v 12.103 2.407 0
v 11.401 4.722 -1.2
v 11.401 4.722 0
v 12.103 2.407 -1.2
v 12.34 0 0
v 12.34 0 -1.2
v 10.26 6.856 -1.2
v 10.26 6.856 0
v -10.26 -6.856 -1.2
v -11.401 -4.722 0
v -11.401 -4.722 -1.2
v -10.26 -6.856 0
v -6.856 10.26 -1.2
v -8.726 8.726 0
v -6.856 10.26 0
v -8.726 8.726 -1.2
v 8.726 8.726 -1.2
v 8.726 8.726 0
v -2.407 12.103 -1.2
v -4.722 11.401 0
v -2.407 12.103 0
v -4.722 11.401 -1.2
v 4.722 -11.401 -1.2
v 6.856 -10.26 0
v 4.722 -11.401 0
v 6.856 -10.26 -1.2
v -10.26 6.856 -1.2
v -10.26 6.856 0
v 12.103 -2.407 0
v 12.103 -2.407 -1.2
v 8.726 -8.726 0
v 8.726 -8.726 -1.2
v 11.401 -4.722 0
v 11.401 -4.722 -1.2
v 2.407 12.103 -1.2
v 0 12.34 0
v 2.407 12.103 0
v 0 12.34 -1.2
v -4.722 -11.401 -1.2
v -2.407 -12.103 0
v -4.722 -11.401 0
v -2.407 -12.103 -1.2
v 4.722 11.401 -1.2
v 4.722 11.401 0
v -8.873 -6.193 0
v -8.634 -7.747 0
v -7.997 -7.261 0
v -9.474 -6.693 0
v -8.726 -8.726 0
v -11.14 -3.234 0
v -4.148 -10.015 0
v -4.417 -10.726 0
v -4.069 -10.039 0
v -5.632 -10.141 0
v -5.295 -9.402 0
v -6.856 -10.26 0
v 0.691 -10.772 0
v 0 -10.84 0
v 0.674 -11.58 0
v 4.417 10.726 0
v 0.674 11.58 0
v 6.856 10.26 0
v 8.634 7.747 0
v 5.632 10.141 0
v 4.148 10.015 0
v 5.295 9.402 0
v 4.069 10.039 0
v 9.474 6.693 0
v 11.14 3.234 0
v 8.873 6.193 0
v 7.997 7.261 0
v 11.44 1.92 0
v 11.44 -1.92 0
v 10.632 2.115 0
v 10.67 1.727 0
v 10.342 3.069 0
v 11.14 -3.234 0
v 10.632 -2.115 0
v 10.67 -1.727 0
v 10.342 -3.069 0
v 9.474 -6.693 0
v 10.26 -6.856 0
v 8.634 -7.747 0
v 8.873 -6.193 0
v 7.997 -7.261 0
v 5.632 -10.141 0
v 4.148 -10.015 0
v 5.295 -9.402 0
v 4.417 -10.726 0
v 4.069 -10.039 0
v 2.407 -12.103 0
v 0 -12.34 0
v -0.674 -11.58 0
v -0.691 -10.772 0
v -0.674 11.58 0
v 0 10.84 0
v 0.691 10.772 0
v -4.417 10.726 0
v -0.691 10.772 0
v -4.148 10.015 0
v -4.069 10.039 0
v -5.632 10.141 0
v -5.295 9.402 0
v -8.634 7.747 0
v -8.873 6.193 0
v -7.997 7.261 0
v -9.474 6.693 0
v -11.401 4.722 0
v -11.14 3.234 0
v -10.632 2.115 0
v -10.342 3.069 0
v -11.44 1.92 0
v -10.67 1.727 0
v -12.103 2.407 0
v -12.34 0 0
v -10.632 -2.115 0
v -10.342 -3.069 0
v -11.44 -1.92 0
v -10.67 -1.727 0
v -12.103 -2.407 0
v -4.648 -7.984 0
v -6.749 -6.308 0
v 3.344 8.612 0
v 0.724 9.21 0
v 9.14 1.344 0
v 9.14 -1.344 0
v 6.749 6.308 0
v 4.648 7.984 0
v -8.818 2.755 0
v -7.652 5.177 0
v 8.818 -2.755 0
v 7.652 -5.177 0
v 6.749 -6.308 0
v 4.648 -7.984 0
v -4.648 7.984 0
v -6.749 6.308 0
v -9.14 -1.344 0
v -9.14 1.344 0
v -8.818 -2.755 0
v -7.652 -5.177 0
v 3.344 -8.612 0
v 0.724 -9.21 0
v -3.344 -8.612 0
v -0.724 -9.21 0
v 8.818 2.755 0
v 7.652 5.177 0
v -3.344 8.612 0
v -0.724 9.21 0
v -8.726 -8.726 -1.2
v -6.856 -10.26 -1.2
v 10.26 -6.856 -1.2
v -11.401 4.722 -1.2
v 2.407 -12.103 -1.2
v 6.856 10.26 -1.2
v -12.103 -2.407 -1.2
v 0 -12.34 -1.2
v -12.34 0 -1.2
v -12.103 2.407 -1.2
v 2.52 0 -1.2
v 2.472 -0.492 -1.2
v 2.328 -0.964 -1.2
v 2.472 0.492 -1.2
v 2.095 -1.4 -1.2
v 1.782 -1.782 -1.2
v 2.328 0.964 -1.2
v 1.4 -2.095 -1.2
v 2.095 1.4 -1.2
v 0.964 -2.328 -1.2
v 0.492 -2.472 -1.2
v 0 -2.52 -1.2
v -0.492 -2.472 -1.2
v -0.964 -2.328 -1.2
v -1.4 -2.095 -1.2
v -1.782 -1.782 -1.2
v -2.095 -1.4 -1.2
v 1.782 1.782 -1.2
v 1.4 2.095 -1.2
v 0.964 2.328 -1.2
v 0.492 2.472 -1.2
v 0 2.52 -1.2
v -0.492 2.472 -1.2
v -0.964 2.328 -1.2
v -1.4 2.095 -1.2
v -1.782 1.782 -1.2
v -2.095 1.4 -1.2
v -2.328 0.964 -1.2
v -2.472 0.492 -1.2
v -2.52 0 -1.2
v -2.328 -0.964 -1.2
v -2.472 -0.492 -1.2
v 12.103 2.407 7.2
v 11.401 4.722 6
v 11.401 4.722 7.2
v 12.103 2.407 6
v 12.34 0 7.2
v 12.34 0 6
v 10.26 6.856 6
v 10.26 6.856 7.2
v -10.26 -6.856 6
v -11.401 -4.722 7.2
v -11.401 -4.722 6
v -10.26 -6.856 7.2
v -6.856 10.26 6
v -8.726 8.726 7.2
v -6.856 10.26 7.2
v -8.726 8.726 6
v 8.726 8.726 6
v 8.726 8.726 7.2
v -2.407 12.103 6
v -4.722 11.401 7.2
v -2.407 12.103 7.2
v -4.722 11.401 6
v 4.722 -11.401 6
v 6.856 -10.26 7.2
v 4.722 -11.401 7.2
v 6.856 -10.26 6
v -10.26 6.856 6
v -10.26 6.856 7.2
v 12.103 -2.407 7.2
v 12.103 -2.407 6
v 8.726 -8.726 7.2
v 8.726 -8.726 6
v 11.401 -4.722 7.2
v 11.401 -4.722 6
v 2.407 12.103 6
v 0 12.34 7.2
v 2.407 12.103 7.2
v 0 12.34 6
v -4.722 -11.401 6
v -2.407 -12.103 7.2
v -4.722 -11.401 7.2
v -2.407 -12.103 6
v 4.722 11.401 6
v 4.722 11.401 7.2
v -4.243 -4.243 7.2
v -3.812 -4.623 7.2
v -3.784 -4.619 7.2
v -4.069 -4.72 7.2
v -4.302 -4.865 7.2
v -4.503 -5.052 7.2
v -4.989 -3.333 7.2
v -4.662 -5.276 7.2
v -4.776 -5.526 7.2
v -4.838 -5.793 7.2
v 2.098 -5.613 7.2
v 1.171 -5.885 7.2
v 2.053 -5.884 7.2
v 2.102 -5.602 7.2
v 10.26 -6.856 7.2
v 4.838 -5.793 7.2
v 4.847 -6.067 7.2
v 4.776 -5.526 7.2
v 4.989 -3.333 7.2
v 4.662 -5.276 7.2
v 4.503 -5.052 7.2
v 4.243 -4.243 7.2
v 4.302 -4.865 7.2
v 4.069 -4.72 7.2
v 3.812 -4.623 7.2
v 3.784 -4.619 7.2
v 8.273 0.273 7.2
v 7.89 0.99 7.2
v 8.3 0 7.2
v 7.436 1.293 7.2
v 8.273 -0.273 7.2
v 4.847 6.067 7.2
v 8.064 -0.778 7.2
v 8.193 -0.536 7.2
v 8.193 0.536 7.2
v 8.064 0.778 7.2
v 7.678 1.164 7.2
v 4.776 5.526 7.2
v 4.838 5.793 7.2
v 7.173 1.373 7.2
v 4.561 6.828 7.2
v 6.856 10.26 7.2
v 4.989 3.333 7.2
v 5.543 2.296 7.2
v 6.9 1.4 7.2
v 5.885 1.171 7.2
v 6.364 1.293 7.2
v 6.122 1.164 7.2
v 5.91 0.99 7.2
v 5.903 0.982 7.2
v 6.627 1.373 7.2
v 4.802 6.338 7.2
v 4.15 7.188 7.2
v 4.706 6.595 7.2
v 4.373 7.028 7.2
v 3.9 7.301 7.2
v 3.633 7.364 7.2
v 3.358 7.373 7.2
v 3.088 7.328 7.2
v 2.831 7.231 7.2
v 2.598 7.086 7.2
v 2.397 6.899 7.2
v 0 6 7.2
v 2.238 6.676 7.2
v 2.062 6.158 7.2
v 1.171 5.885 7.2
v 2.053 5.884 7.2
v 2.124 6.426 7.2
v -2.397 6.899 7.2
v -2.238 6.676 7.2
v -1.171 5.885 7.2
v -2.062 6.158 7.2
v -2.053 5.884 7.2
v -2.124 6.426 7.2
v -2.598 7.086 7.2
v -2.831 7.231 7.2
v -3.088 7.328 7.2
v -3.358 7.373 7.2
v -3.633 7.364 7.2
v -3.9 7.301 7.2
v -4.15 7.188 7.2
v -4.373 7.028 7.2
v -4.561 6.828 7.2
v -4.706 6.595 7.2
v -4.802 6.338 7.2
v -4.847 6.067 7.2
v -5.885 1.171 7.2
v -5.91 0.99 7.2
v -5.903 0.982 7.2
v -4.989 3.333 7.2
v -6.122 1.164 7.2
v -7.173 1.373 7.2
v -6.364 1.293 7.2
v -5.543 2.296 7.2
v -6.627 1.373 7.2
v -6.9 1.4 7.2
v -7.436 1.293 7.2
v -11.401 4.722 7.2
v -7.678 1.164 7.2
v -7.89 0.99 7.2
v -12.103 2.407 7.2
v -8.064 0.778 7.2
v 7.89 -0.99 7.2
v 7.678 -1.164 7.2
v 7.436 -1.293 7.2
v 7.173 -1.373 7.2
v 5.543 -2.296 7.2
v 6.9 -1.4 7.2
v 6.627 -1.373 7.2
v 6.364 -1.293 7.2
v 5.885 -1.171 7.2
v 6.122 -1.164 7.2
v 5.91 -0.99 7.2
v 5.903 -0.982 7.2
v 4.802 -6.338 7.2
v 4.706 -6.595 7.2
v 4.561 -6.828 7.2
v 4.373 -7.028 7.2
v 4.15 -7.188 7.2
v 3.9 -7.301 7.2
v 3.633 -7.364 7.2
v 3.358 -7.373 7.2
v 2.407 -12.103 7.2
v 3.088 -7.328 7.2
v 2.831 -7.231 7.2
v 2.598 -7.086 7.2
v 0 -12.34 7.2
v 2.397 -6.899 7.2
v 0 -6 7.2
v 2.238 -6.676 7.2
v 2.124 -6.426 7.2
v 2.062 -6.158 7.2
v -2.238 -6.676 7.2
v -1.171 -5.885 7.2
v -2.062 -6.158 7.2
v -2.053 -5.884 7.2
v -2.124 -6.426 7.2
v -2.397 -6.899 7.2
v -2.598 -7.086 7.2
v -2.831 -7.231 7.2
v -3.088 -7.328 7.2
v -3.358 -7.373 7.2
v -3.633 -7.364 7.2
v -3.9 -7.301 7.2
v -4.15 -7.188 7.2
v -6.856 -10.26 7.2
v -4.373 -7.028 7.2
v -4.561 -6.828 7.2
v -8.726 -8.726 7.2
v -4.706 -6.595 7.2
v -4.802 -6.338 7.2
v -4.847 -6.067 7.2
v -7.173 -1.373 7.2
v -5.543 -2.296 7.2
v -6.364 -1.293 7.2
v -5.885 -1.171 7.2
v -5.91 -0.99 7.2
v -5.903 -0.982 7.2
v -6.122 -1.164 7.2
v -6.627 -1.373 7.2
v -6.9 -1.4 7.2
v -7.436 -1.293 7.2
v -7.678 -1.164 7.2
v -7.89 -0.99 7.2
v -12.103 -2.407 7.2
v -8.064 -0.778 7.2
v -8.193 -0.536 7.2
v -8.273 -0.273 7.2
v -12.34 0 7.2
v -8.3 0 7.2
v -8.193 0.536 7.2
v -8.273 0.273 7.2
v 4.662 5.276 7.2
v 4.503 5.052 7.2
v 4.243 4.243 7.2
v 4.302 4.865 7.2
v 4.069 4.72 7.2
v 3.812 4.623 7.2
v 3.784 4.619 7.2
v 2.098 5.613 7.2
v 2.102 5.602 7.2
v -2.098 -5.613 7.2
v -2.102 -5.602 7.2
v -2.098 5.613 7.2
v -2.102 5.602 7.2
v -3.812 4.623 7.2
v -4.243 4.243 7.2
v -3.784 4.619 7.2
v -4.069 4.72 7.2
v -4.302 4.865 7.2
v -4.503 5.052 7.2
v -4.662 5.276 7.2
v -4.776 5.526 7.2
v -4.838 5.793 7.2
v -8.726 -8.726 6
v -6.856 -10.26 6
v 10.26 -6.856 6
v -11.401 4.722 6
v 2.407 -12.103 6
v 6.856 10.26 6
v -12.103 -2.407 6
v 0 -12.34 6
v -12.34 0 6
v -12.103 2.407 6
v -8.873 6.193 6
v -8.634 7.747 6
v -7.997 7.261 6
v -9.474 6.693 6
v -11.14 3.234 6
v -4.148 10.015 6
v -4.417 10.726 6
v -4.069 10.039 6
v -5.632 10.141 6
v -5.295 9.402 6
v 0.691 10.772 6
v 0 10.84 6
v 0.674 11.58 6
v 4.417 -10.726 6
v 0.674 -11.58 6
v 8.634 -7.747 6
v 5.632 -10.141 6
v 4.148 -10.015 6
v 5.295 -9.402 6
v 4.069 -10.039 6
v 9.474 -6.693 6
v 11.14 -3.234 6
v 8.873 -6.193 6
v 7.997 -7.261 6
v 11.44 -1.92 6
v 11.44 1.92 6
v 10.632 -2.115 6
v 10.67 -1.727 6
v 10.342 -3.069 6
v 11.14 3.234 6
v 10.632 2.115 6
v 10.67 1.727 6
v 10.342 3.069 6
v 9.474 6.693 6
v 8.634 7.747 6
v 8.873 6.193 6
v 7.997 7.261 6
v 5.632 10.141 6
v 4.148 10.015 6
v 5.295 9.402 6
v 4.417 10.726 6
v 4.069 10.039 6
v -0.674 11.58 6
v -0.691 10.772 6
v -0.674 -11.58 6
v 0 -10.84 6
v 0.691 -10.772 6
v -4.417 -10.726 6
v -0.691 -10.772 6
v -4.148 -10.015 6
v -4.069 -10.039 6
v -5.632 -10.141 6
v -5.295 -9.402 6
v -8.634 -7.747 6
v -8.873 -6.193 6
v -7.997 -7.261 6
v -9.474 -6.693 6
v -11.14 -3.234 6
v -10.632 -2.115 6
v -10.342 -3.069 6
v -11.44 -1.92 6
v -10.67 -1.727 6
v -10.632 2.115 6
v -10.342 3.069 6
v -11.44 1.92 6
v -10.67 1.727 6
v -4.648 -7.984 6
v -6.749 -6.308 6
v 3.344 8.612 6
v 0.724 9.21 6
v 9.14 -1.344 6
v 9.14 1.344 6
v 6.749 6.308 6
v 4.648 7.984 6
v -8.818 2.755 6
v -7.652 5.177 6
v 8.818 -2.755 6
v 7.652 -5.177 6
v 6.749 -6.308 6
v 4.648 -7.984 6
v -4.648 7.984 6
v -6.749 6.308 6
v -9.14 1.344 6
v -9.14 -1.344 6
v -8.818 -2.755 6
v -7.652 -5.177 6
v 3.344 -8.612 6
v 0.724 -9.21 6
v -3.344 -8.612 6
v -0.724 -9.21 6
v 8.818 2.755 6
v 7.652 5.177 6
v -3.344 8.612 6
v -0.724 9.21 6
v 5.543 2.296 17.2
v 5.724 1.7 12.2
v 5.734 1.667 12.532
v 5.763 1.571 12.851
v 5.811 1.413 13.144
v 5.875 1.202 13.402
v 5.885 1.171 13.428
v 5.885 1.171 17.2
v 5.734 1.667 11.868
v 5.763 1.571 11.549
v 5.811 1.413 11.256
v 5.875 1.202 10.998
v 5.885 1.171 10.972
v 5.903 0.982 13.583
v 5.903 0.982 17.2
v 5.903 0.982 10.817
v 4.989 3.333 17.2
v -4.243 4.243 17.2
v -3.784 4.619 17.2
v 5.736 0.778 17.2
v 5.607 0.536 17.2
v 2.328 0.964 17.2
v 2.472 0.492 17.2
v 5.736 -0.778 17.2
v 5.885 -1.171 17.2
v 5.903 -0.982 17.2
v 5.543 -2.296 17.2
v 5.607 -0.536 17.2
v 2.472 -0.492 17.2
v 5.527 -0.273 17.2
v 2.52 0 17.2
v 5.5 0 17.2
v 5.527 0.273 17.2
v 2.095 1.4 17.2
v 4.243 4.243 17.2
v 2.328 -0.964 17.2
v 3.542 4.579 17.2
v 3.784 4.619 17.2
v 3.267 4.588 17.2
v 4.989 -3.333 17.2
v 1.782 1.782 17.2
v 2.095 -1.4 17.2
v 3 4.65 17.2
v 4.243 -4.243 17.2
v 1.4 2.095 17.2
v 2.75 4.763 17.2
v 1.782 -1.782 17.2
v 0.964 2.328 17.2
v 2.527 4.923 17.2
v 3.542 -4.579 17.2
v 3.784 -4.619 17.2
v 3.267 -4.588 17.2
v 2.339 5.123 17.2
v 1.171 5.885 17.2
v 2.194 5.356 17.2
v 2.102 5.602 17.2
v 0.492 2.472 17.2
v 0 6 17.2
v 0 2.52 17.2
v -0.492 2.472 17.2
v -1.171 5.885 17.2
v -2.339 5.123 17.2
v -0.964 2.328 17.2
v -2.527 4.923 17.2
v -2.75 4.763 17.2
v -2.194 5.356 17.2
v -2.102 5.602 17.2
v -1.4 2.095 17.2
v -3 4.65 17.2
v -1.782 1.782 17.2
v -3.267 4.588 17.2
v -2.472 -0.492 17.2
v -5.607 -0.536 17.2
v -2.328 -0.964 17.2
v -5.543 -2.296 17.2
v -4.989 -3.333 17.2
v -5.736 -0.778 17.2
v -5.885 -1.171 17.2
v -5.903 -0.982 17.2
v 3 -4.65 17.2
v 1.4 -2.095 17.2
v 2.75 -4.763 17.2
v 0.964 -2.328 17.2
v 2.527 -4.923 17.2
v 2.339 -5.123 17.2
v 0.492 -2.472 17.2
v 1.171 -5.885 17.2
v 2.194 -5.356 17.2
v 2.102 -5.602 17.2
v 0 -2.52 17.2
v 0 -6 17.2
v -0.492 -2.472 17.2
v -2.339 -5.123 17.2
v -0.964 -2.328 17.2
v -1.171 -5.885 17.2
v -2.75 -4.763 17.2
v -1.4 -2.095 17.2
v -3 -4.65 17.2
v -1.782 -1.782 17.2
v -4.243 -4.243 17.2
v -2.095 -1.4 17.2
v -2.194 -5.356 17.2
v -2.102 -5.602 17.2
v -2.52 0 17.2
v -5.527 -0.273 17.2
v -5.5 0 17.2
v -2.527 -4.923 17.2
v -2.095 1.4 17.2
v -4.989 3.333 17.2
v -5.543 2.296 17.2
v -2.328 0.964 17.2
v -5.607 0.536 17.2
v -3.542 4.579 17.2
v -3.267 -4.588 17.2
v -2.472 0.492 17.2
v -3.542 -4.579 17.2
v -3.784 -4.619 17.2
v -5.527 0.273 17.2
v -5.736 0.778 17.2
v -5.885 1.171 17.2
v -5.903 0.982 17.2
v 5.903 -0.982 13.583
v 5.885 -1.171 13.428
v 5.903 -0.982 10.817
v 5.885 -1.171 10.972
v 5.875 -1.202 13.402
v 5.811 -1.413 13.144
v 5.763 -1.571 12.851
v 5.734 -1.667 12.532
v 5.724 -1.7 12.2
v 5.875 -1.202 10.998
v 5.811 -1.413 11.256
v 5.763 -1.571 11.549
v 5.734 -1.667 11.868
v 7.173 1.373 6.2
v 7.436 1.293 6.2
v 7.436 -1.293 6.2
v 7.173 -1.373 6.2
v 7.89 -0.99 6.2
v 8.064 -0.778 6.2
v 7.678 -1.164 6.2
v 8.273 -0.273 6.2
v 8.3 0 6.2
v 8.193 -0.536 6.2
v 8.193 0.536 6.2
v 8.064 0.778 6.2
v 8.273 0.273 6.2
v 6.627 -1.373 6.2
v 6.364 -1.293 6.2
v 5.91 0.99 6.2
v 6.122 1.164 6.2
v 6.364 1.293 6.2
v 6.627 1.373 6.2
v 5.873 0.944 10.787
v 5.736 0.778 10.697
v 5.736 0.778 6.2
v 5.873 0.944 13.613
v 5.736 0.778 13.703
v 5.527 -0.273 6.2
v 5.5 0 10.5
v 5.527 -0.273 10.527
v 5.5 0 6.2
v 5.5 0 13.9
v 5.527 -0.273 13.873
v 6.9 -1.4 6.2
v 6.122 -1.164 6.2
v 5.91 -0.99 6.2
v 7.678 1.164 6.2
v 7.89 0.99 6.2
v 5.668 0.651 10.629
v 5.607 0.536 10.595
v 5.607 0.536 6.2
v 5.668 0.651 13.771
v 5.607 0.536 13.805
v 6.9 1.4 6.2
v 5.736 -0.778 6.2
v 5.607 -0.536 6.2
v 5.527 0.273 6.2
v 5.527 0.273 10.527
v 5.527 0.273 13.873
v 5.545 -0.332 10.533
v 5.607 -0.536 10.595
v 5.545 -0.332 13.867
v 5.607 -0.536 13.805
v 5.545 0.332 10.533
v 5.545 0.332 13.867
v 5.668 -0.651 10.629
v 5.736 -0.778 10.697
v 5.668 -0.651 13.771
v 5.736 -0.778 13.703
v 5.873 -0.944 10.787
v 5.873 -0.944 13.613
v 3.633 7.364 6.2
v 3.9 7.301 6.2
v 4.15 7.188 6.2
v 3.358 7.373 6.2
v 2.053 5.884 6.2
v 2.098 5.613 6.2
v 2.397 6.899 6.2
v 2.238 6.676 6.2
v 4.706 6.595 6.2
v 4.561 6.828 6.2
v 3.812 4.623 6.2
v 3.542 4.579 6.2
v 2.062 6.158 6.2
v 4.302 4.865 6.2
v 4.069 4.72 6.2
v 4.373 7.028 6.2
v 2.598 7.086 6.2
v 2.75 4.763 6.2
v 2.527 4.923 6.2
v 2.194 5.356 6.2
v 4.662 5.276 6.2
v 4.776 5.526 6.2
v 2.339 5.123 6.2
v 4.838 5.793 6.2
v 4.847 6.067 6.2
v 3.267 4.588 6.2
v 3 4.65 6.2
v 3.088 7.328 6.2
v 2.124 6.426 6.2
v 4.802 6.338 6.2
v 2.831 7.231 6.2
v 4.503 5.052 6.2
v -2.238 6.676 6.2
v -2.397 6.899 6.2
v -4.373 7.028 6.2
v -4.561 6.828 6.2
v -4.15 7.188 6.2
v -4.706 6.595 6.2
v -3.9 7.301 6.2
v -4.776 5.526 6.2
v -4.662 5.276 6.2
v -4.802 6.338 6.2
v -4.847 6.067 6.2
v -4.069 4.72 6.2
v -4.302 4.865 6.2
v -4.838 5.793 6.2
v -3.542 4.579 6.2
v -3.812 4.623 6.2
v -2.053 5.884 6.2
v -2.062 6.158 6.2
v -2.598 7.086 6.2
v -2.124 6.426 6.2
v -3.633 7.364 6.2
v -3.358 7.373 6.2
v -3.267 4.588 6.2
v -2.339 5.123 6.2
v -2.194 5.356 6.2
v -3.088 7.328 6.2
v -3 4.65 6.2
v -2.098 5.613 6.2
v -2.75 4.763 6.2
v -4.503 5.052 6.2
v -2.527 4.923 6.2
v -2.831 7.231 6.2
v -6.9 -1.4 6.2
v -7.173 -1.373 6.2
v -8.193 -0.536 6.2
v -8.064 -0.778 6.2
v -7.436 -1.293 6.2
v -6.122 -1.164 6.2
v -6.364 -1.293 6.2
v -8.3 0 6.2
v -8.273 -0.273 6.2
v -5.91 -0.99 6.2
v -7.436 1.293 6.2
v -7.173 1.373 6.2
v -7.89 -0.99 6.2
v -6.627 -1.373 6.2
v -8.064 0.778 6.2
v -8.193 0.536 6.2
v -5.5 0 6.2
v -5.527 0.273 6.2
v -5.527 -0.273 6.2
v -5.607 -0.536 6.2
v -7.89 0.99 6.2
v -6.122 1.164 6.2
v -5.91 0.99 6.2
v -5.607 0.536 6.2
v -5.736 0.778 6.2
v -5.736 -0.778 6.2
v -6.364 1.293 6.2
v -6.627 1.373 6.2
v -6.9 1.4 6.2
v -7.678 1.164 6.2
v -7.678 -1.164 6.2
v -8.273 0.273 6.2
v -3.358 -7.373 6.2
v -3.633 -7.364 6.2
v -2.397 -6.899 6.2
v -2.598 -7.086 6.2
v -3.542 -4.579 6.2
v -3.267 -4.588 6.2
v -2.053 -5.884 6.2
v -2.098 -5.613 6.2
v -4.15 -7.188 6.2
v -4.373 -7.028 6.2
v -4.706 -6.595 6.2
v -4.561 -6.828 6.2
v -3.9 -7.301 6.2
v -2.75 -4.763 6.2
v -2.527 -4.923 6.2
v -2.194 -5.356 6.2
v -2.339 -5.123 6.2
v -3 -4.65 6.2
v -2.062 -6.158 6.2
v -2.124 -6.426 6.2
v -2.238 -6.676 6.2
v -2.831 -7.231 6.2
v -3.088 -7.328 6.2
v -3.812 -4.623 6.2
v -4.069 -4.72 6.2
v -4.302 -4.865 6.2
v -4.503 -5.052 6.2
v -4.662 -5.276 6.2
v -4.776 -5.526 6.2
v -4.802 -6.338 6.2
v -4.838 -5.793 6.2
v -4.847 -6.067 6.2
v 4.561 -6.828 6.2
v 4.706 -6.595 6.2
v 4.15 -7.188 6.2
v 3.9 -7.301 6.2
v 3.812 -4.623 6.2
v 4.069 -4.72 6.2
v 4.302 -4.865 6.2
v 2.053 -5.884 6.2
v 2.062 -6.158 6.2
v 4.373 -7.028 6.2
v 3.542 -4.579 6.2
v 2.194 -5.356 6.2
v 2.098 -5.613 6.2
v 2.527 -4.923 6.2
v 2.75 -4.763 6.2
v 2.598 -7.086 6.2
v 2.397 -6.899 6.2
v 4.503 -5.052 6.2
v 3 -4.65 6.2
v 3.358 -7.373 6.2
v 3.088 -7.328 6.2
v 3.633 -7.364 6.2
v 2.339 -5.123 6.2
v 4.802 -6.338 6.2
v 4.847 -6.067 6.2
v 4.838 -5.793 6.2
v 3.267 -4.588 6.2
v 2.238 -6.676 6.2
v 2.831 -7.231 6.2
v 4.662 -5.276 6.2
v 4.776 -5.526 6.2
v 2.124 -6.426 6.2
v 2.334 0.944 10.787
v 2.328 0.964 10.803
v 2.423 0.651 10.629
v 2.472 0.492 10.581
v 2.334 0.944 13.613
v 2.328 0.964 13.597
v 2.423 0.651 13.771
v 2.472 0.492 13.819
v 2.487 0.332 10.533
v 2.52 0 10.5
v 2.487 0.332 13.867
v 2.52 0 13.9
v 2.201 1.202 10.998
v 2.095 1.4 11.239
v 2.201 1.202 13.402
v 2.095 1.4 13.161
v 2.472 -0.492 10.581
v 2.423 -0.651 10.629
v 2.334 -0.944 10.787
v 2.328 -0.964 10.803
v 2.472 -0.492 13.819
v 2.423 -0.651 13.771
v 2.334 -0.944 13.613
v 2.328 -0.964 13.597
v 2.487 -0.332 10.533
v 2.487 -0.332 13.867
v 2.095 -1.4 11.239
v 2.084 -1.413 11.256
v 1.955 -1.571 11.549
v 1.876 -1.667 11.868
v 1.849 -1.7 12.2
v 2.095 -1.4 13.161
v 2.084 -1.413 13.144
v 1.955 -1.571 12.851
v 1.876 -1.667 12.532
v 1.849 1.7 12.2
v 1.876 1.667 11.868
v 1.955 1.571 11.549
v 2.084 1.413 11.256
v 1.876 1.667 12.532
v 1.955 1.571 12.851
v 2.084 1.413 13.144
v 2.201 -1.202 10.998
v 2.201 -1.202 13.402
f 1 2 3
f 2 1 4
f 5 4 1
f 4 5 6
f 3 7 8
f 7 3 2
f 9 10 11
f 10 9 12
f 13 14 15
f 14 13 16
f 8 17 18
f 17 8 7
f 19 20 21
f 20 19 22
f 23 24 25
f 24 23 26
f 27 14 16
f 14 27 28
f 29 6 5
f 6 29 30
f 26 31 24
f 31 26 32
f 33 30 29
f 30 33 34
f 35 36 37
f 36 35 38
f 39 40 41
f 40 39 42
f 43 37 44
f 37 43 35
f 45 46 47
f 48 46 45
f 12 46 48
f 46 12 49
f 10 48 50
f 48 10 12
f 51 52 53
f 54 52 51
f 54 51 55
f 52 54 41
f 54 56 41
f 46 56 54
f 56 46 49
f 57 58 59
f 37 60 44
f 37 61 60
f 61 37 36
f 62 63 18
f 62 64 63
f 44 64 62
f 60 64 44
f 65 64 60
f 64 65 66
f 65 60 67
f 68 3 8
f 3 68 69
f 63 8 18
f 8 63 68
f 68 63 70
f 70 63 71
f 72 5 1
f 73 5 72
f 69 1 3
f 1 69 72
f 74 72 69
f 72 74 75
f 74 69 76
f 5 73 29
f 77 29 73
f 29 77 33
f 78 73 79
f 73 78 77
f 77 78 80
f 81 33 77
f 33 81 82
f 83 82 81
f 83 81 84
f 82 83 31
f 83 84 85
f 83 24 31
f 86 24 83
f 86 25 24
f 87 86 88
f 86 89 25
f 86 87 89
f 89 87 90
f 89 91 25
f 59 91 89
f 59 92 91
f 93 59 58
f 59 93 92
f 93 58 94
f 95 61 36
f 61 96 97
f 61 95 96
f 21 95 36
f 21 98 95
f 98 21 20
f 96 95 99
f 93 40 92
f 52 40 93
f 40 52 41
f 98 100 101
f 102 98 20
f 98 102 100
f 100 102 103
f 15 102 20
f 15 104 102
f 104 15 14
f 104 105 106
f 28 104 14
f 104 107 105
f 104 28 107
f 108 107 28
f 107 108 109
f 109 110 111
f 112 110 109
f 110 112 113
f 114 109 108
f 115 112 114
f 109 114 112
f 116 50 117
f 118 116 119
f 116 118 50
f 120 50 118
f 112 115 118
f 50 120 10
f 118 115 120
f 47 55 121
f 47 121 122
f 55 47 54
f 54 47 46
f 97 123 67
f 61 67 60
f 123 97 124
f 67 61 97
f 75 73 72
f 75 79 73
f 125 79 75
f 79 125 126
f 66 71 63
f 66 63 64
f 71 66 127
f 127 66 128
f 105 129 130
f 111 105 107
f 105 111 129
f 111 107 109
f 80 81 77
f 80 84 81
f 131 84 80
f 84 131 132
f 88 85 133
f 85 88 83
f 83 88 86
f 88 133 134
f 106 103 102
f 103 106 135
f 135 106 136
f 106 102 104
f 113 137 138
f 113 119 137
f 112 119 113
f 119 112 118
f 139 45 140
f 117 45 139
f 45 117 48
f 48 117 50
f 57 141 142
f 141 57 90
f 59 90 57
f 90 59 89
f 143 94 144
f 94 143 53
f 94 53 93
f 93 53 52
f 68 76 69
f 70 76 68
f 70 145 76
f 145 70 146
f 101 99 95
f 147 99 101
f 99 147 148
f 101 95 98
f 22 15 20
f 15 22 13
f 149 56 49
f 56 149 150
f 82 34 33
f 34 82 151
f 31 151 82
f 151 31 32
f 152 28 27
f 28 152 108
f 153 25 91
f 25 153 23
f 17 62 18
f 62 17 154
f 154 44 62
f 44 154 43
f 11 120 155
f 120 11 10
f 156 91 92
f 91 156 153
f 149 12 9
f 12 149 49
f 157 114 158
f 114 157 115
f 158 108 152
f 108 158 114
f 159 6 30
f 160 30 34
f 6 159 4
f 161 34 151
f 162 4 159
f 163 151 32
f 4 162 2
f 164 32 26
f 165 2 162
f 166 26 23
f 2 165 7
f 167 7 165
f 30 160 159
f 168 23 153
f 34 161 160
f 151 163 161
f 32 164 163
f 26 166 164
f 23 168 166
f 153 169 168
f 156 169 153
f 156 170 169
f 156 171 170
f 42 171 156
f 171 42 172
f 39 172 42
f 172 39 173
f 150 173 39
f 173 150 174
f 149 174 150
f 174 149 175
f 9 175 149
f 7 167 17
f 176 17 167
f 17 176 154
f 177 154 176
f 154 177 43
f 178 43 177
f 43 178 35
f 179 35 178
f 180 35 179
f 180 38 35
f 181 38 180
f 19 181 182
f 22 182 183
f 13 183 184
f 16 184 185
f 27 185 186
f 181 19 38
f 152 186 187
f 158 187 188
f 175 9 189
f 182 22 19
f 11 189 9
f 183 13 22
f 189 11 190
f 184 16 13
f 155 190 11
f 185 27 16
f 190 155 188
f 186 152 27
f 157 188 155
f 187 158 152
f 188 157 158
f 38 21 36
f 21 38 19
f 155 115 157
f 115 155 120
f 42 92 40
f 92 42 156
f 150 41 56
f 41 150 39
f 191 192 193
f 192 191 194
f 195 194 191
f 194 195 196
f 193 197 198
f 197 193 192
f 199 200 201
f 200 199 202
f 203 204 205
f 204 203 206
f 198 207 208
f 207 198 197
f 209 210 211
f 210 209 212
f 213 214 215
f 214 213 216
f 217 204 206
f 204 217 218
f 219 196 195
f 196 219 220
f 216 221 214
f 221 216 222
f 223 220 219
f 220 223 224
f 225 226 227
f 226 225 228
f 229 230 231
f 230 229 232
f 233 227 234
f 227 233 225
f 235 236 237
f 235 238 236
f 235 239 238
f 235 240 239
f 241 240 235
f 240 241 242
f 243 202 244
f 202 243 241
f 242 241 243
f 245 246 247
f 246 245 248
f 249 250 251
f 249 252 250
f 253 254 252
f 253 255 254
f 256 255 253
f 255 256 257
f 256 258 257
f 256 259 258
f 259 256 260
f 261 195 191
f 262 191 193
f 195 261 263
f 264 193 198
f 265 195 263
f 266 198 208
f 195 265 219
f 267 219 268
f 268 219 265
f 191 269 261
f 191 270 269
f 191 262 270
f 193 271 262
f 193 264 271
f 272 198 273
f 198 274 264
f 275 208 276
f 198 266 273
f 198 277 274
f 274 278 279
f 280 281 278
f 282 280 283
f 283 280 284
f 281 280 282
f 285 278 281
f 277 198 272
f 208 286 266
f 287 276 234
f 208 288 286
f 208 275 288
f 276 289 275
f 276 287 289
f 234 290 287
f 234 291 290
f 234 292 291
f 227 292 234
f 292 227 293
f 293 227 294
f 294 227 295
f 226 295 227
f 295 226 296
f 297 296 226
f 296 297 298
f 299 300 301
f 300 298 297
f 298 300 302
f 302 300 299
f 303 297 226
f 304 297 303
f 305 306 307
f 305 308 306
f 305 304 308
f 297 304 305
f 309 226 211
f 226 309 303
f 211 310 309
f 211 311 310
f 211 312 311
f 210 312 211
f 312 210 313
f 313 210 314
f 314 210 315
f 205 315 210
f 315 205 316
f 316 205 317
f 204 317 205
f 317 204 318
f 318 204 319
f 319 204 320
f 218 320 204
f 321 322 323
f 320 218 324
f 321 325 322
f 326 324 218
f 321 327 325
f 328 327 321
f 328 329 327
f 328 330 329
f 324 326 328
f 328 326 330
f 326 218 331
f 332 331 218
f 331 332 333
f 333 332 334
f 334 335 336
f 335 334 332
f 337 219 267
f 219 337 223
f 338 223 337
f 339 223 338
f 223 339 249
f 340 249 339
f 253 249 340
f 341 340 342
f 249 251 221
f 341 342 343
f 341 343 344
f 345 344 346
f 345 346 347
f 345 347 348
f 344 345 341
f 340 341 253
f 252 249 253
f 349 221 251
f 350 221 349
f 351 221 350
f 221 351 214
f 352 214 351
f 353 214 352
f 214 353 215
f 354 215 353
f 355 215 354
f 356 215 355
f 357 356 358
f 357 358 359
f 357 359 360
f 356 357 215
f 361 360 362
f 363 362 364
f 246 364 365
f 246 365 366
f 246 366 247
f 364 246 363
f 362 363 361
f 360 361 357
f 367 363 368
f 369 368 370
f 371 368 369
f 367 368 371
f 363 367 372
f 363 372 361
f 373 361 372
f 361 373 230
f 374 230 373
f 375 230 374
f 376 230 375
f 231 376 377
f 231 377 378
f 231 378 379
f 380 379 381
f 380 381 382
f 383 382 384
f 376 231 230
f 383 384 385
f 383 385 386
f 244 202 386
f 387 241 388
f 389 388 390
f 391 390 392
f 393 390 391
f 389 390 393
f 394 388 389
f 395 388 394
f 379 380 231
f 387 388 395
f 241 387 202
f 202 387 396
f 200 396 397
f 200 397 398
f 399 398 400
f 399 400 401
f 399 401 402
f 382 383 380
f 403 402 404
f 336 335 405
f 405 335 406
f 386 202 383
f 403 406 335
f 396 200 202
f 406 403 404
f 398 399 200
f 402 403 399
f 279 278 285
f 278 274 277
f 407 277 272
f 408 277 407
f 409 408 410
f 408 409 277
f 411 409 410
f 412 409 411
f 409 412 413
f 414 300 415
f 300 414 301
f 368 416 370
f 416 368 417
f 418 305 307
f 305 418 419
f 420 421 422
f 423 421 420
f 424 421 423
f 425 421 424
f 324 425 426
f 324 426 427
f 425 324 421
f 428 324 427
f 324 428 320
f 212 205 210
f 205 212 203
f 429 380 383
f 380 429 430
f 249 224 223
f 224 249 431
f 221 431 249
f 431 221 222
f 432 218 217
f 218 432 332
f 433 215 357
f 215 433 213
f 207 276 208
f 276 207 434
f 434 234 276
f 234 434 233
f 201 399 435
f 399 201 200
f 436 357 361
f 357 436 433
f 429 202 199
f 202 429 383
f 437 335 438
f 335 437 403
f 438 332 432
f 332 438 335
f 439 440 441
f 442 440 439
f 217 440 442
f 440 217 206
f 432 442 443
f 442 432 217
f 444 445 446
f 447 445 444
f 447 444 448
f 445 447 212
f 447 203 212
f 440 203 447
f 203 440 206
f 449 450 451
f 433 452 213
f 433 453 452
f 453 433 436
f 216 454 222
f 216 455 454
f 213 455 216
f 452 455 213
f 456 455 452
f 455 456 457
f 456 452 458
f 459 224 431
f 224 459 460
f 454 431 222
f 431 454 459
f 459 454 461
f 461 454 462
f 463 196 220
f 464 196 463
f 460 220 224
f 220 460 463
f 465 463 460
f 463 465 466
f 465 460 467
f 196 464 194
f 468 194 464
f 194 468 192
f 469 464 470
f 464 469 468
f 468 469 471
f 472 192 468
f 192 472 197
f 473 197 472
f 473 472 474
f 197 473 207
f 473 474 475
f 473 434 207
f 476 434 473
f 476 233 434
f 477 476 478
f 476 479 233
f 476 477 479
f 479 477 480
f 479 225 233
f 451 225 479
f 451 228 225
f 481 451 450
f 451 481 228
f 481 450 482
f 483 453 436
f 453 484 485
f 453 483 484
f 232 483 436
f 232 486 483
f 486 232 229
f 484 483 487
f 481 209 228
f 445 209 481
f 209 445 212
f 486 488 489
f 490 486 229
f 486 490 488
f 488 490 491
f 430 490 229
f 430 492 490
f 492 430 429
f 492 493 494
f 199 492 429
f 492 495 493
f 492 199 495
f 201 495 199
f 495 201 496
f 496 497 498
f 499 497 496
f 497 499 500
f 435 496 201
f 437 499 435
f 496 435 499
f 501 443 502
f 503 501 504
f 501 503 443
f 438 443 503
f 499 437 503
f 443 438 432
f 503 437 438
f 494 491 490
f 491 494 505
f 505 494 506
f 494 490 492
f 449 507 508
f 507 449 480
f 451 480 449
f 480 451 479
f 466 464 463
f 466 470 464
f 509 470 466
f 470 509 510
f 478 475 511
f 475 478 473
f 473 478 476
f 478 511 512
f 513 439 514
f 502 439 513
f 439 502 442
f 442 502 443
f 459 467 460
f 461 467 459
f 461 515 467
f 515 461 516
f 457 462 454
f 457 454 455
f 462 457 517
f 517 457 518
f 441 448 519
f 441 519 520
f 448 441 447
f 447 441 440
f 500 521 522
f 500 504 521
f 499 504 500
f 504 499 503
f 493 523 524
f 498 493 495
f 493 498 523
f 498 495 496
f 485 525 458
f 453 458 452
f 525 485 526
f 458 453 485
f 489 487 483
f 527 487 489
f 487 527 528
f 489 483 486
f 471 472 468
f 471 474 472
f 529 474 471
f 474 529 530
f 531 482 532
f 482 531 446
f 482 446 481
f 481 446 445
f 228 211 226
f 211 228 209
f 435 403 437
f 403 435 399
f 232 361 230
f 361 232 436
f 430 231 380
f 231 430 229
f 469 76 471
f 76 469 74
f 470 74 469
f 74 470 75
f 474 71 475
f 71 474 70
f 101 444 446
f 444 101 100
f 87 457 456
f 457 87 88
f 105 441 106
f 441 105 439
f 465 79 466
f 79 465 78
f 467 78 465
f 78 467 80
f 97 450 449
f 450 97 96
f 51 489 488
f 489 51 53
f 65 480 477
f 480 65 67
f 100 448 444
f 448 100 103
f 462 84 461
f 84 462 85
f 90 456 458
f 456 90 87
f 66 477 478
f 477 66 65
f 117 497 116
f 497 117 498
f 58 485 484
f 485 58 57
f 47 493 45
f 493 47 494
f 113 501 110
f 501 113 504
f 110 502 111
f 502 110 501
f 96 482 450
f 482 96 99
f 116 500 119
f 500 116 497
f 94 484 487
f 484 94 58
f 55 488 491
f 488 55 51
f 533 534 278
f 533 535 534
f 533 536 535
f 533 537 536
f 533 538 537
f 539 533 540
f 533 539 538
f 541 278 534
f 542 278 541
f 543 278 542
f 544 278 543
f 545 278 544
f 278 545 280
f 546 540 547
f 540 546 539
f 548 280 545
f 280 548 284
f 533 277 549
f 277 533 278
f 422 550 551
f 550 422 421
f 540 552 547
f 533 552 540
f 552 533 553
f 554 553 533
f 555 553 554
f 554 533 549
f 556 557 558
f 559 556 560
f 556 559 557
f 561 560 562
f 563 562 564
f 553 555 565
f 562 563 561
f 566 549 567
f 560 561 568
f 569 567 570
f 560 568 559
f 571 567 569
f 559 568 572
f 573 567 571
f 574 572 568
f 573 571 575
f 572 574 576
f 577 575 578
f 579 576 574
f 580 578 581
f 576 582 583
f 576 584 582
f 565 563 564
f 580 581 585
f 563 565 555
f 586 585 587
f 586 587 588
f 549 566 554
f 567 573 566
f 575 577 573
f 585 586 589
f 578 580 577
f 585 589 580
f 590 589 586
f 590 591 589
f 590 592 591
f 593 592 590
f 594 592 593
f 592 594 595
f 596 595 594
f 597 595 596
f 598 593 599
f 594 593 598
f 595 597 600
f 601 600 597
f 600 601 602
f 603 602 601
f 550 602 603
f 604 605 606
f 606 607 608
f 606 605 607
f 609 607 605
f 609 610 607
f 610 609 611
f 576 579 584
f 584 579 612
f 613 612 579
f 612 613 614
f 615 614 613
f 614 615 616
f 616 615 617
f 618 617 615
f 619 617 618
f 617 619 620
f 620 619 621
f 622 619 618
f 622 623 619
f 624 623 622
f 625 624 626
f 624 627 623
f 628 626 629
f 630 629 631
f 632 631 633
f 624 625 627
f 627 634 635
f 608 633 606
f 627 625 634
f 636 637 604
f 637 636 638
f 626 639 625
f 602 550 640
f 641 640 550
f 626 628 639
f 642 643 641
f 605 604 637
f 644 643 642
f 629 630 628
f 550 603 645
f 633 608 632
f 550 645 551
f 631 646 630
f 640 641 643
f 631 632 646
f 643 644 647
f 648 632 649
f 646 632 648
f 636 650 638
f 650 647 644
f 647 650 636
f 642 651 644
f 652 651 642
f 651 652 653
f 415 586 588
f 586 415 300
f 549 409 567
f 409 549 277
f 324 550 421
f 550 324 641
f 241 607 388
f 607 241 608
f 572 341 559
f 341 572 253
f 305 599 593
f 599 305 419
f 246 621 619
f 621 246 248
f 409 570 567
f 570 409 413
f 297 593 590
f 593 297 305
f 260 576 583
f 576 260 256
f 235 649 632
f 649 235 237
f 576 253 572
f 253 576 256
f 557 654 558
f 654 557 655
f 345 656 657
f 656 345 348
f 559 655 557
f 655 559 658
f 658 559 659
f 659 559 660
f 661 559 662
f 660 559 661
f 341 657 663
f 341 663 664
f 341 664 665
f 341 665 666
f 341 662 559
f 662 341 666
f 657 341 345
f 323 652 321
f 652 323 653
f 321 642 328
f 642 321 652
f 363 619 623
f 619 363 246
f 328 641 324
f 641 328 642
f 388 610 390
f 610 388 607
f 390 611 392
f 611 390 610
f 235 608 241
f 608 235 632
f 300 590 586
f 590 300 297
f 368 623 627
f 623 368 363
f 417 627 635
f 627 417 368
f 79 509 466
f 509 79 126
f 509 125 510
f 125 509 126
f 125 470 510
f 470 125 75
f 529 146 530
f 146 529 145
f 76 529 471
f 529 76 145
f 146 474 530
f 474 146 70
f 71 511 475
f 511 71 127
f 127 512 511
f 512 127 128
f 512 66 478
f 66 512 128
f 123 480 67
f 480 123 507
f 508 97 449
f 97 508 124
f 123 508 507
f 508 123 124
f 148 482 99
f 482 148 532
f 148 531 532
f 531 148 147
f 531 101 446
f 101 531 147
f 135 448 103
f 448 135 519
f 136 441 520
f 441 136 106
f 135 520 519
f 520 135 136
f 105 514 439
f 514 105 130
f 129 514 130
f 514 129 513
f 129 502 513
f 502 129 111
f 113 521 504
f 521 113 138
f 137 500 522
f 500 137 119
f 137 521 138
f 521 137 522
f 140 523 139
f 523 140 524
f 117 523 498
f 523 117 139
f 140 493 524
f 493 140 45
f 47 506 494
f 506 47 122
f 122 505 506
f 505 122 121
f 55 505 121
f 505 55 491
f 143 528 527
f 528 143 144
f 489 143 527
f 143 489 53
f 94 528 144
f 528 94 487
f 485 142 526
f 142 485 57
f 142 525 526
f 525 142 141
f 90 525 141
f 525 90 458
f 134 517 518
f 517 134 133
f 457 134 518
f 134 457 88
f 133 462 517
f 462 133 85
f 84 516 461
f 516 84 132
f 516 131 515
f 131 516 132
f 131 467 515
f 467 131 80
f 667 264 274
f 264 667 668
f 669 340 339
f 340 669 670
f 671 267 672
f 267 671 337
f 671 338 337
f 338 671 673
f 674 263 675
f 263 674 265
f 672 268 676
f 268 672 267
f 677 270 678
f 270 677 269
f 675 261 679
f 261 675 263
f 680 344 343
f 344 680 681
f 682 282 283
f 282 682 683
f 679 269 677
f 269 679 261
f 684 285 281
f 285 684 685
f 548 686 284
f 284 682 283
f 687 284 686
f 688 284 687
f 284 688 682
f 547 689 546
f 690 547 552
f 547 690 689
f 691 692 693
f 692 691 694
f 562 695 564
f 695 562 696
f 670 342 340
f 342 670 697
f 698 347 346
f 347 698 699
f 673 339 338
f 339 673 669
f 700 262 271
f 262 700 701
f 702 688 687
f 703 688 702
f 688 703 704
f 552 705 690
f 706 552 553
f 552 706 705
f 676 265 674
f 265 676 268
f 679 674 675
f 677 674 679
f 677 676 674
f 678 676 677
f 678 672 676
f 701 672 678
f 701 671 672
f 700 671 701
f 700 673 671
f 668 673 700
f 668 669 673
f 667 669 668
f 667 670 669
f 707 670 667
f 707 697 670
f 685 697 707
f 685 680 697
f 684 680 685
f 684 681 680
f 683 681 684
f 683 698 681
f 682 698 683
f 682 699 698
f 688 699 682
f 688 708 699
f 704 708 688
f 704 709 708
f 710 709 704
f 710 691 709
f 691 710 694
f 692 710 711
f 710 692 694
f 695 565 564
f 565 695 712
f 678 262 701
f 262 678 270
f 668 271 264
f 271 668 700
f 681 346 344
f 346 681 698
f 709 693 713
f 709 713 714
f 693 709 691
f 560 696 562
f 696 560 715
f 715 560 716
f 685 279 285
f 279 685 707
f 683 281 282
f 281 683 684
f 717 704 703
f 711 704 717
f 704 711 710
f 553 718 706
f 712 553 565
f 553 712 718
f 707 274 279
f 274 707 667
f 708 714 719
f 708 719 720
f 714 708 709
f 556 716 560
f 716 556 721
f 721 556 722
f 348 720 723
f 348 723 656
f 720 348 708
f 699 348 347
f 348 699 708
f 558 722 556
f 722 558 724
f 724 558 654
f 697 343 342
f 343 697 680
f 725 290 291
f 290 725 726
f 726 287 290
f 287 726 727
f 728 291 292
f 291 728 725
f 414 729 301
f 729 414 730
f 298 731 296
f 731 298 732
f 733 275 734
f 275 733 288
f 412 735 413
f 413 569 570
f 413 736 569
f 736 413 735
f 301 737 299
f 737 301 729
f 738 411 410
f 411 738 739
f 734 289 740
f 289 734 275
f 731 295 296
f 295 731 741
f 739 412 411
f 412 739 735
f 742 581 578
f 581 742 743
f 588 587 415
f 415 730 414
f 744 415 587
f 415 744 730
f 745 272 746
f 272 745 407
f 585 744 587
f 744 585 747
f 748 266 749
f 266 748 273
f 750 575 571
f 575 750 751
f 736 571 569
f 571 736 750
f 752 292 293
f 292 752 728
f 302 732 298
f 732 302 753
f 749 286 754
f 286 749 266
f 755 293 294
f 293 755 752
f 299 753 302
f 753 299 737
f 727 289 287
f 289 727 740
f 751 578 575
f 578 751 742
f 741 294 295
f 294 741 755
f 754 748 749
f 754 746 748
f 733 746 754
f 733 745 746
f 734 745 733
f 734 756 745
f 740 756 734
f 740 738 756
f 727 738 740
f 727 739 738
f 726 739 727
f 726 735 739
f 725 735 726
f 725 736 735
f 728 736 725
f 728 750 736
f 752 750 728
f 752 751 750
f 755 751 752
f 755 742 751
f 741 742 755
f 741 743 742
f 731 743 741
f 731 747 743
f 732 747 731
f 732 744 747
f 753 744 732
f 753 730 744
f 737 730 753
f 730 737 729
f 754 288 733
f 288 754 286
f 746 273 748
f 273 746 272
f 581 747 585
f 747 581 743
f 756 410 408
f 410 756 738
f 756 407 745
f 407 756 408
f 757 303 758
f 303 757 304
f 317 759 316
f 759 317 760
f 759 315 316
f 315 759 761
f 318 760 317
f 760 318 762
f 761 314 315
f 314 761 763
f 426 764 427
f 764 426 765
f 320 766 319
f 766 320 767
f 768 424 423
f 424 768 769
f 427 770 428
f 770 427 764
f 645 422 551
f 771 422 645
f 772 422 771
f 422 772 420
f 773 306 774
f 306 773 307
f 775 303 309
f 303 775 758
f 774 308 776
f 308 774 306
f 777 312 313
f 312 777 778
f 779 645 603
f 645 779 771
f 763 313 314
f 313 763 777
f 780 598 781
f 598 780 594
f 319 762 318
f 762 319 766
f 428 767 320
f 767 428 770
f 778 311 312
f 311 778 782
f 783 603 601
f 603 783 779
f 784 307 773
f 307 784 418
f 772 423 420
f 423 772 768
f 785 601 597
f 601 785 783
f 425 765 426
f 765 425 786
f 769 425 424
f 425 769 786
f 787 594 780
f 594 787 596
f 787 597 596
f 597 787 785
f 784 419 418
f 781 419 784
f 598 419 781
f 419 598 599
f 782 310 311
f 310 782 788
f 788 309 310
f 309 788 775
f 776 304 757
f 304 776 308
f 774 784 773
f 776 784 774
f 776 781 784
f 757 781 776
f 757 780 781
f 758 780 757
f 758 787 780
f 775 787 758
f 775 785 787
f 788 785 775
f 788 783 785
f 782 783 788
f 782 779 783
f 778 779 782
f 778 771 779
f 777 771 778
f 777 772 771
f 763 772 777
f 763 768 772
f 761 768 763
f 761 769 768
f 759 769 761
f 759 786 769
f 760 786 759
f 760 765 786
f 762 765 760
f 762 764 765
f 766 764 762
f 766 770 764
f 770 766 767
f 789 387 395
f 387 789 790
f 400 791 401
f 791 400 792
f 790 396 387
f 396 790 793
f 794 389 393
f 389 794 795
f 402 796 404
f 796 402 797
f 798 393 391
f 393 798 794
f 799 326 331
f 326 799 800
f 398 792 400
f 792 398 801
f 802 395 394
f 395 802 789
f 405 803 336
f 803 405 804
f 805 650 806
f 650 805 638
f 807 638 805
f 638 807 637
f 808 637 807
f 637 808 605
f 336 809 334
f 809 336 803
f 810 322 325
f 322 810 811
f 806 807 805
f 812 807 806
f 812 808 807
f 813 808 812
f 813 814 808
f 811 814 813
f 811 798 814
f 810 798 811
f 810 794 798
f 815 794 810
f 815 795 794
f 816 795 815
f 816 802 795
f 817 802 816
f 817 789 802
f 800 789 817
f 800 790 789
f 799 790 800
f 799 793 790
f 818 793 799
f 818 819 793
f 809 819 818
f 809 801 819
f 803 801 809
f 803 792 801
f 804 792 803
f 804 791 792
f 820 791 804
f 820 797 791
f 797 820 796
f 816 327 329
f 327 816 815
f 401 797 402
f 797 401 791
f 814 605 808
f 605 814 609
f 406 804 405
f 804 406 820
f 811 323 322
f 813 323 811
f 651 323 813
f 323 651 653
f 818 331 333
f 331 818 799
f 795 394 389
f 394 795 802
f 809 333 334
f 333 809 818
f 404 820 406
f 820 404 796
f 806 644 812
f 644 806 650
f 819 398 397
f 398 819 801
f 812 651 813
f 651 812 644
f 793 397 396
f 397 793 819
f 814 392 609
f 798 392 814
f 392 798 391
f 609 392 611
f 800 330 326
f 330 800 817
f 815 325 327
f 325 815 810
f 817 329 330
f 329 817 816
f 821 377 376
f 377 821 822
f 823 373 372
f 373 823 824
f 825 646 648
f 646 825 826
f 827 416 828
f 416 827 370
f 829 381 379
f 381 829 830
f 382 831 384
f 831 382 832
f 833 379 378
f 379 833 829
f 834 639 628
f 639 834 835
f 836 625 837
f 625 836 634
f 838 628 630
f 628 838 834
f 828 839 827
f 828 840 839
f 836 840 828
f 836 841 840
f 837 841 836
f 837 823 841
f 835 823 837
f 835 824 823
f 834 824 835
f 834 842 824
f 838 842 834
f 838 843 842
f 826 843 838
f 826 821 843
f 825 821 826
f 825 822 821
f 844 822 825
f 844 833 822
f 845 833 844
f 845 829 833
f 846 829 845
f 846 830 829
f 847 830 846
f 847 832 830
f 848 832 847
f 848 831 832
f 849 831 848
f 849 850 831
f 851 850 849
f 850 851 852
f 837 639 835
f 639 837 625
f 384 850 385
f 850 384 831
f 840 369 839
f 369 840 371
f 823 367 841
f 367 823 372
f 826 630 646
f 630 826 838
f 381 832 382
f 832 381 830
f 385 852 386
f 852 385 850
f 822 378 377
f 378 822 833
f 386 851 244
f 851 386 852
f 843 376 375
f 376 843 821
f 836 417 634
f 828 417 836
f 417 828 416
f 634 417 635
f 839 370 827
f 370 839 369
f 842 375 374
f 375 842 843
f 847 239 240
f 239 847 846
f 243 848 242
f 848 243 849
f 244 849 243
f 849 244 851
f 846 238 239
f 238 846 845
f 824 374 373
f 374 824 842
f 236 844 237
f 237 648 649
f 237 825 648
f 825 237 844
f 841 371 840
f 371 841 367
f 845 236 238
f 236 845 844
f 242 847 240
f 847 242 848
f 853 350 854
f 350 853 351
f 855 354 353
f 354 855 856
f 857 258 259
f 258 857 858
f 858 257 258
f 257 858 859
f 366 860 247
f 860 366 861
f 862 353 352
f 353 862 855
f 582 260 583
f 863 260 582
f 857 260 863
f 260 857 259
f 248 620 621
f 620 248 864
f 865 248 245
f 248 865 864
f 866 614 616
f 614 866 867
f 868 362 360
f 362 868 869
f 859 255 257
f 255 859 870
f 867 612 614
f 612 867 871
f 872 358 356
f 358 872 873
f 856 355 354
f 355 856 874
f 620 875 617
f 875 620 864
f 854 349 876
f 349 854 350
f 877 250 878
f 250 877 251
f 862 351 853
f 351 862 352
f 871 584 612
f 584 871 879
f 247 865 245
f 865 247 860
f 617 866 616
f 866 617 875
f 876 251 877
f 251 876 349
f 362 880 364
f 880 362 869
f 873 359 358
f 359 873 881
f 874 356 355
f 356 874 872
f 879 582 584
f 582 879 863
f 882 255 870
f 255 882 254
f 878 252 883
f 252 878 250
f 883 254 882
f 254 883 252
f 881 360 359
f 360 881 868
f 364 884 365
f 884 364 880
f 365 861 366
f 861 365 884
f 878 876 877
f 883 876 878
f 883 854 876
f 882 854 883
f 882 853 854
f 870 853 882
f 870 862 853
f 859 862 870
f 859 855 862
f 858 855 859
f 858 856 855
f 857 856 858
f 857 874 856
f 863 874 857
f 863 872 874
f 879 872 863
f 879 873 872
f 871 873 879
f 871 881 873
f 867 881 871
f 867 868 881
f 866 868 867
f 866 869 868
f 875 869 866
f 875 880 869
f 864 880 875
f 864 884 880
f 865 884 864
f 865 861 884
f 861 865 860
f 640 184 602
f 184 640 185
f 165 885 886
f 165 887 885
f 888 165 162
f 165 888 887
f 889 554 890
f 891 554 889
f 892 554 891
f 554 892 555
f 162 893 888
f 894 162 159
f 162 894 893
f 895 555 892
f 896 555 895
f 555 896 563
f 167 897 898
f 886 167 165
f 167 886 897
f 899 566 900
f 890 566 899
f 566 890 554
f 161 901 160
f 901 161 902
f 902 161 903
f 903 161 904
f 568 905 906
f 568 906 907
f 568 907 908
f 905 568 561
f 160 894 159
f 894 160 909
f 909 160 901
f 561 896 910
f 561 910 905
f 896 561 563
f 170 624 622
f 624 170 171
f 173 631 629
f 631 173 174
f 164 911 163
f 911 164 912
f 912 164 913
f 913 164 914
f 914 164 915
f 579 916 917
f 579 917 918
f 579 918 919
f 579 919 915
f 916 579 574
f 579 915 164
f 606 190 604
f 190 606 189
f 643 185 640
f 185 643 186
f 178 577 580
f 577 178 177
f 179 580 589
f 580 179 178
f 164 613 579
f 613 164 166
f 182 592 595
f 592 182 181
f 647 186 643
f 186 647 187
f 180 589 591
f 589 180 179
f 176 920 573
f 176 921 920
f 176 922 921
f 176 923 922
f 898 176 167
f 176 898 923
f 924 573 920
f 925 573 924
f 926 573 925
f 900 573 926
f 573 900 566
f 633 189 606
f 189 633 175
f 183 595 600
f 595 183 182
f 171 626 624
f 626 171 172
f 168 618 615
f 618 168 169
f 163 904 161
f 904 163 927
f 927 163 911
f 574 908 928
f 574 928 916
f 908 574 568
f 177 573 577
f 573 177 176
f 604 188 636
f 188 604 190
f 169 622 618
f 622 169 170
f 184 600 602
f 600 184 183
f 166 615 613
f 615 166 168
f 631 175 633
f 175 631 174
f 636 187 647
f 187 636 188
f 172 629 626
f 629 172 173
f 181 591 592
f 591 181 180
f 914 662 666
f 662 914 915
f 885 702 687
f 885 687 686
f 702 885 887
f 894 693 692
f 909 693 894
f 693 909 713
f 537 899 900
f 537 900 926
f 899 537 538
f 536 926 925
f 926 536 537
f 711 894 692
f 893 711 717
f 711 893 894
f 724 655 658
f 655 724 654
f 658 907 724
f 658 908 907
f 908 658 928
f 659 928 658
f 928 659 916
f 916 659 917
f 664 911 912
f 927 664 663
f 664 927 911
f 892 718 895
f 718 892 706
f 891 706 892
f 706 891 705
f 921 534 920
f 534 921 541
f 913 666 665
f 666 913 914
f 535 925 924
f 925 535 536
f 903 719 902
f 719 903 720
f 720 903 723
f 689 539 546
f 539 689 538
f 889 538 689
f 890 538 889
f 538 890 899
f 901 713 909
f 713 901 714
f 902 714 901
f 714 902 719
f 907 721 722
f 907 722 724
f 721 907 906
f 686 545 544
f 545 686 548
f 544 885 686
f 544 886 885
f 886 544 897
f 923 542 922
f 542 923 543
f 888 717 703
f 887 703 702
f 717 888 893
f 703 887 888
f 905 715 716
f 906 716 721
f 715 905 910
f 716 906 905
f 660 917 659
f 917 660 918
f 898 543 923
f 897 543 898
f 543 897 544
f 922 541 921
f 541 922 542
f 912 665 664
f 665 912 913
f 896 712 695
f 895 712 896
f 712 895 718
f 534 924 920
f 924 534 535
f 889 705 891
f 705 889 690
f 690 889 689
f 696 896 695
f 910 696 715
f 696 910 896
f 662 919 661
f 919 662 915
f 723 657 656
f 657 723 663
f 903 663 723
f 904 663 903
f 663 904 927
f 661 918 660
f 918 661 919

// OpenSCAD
$fn = 32;

// ----------------------------------------------------------------------
// Timing pulley: HTD5 14T, pitch 5 mm, 24.68 mm x 18.4 mm
// ----------------------------------------------------------------------

// --- parameters (mm) ---
belt_pitch = 5;           // belt pitch
n_teeth = 14;             // number of grooves
rim_w = 6;                // belt width between the flanges
tip_d = 21.68;            // tip circle diameter
root_d = 19.48;           // groove bottom diameter
groove_h = 1.1;           // groove depth
tooth_w = 3.2;            // groove width at the tip circle
rim_d = 24.68;            // flange diameter
rim_t = 1.2;              // flange thickness
spigot_d = 17.88;         // flange spigot, sunk into the rim
spigot_h = 1.2;           // spigot depth into the rim
shaft_d = 5.04;           // shaft bore
hub_d = 12;               // hub diameter
hub_h = 10;               // hub above the flange
bottom_z = -1.2;          // lowest point of the pulley
top_z = 17.2;             // highest point of the pulley
set_d = 3.4;              // set screw tap hole
ring_d = 2.8;             // clamp screw hole
ring_r = 6.9;             // clamp screw radius

module rim() {
  cylinder(h = rim_w, d = tip_d);
}

module groove_cutter() {
  /* belt tooth groove: deeper than wide, cut through the belt width */
  translate([root_d / 2, 0, 0])
    linear_extrude(height = rim_w)
      polygon(points = [[-0.6, -tooth_w * 0.42], [groove_h + 0.6, -tooth_w * 0.6],
                        [groove_h + 0.6, tooth_w * 0.6], [-0.6, tooth_w * 0.42]]);
}

module flanges() {
  translate([0, 0, -rim_t]) cylinder(h = rim_t, d = rim_d);
  translate([0, 0, rim_w]) cylinder(h = rim_t, d = rim_d);
  translate([0, 0, -spigot_h]) cylinder(h = spigot_h + 0.6, d = spigot_d);
  translate([0, 0, rim_w - 0.6]) cylinder(h = spigot_h + 0.6, d = spigot_d);
}

module hub() {
  translate([0, 0, bottom_z]) cylinder(h = top_z - bottom_z, d = hub_d);
}

difference() {
  union() {
    rim();
    hub();
    flanges();
  }
  for (i = [0 : n_teeth - 1]) rotate([0, 0, i * 360 / n_teeth]) groove_cutter();
  translate([0, 0, bottom_z - 1]) cylinder(h = top_z - bottom_z + 2, d = shaft_d);
  translate([-1, 0, top_z - hub_h * 0.5]) rotate([0, 90, 0]) cylinder(h = hub_d / 2 + 3, d = set_d);
  for (i = [0 : 5]) rotate([0, 0, i * 60]) translate([ring_r, 0, top_z - hub_h - 1])
    cylinder(h = hub_h + 2, d = ring_d);
}
